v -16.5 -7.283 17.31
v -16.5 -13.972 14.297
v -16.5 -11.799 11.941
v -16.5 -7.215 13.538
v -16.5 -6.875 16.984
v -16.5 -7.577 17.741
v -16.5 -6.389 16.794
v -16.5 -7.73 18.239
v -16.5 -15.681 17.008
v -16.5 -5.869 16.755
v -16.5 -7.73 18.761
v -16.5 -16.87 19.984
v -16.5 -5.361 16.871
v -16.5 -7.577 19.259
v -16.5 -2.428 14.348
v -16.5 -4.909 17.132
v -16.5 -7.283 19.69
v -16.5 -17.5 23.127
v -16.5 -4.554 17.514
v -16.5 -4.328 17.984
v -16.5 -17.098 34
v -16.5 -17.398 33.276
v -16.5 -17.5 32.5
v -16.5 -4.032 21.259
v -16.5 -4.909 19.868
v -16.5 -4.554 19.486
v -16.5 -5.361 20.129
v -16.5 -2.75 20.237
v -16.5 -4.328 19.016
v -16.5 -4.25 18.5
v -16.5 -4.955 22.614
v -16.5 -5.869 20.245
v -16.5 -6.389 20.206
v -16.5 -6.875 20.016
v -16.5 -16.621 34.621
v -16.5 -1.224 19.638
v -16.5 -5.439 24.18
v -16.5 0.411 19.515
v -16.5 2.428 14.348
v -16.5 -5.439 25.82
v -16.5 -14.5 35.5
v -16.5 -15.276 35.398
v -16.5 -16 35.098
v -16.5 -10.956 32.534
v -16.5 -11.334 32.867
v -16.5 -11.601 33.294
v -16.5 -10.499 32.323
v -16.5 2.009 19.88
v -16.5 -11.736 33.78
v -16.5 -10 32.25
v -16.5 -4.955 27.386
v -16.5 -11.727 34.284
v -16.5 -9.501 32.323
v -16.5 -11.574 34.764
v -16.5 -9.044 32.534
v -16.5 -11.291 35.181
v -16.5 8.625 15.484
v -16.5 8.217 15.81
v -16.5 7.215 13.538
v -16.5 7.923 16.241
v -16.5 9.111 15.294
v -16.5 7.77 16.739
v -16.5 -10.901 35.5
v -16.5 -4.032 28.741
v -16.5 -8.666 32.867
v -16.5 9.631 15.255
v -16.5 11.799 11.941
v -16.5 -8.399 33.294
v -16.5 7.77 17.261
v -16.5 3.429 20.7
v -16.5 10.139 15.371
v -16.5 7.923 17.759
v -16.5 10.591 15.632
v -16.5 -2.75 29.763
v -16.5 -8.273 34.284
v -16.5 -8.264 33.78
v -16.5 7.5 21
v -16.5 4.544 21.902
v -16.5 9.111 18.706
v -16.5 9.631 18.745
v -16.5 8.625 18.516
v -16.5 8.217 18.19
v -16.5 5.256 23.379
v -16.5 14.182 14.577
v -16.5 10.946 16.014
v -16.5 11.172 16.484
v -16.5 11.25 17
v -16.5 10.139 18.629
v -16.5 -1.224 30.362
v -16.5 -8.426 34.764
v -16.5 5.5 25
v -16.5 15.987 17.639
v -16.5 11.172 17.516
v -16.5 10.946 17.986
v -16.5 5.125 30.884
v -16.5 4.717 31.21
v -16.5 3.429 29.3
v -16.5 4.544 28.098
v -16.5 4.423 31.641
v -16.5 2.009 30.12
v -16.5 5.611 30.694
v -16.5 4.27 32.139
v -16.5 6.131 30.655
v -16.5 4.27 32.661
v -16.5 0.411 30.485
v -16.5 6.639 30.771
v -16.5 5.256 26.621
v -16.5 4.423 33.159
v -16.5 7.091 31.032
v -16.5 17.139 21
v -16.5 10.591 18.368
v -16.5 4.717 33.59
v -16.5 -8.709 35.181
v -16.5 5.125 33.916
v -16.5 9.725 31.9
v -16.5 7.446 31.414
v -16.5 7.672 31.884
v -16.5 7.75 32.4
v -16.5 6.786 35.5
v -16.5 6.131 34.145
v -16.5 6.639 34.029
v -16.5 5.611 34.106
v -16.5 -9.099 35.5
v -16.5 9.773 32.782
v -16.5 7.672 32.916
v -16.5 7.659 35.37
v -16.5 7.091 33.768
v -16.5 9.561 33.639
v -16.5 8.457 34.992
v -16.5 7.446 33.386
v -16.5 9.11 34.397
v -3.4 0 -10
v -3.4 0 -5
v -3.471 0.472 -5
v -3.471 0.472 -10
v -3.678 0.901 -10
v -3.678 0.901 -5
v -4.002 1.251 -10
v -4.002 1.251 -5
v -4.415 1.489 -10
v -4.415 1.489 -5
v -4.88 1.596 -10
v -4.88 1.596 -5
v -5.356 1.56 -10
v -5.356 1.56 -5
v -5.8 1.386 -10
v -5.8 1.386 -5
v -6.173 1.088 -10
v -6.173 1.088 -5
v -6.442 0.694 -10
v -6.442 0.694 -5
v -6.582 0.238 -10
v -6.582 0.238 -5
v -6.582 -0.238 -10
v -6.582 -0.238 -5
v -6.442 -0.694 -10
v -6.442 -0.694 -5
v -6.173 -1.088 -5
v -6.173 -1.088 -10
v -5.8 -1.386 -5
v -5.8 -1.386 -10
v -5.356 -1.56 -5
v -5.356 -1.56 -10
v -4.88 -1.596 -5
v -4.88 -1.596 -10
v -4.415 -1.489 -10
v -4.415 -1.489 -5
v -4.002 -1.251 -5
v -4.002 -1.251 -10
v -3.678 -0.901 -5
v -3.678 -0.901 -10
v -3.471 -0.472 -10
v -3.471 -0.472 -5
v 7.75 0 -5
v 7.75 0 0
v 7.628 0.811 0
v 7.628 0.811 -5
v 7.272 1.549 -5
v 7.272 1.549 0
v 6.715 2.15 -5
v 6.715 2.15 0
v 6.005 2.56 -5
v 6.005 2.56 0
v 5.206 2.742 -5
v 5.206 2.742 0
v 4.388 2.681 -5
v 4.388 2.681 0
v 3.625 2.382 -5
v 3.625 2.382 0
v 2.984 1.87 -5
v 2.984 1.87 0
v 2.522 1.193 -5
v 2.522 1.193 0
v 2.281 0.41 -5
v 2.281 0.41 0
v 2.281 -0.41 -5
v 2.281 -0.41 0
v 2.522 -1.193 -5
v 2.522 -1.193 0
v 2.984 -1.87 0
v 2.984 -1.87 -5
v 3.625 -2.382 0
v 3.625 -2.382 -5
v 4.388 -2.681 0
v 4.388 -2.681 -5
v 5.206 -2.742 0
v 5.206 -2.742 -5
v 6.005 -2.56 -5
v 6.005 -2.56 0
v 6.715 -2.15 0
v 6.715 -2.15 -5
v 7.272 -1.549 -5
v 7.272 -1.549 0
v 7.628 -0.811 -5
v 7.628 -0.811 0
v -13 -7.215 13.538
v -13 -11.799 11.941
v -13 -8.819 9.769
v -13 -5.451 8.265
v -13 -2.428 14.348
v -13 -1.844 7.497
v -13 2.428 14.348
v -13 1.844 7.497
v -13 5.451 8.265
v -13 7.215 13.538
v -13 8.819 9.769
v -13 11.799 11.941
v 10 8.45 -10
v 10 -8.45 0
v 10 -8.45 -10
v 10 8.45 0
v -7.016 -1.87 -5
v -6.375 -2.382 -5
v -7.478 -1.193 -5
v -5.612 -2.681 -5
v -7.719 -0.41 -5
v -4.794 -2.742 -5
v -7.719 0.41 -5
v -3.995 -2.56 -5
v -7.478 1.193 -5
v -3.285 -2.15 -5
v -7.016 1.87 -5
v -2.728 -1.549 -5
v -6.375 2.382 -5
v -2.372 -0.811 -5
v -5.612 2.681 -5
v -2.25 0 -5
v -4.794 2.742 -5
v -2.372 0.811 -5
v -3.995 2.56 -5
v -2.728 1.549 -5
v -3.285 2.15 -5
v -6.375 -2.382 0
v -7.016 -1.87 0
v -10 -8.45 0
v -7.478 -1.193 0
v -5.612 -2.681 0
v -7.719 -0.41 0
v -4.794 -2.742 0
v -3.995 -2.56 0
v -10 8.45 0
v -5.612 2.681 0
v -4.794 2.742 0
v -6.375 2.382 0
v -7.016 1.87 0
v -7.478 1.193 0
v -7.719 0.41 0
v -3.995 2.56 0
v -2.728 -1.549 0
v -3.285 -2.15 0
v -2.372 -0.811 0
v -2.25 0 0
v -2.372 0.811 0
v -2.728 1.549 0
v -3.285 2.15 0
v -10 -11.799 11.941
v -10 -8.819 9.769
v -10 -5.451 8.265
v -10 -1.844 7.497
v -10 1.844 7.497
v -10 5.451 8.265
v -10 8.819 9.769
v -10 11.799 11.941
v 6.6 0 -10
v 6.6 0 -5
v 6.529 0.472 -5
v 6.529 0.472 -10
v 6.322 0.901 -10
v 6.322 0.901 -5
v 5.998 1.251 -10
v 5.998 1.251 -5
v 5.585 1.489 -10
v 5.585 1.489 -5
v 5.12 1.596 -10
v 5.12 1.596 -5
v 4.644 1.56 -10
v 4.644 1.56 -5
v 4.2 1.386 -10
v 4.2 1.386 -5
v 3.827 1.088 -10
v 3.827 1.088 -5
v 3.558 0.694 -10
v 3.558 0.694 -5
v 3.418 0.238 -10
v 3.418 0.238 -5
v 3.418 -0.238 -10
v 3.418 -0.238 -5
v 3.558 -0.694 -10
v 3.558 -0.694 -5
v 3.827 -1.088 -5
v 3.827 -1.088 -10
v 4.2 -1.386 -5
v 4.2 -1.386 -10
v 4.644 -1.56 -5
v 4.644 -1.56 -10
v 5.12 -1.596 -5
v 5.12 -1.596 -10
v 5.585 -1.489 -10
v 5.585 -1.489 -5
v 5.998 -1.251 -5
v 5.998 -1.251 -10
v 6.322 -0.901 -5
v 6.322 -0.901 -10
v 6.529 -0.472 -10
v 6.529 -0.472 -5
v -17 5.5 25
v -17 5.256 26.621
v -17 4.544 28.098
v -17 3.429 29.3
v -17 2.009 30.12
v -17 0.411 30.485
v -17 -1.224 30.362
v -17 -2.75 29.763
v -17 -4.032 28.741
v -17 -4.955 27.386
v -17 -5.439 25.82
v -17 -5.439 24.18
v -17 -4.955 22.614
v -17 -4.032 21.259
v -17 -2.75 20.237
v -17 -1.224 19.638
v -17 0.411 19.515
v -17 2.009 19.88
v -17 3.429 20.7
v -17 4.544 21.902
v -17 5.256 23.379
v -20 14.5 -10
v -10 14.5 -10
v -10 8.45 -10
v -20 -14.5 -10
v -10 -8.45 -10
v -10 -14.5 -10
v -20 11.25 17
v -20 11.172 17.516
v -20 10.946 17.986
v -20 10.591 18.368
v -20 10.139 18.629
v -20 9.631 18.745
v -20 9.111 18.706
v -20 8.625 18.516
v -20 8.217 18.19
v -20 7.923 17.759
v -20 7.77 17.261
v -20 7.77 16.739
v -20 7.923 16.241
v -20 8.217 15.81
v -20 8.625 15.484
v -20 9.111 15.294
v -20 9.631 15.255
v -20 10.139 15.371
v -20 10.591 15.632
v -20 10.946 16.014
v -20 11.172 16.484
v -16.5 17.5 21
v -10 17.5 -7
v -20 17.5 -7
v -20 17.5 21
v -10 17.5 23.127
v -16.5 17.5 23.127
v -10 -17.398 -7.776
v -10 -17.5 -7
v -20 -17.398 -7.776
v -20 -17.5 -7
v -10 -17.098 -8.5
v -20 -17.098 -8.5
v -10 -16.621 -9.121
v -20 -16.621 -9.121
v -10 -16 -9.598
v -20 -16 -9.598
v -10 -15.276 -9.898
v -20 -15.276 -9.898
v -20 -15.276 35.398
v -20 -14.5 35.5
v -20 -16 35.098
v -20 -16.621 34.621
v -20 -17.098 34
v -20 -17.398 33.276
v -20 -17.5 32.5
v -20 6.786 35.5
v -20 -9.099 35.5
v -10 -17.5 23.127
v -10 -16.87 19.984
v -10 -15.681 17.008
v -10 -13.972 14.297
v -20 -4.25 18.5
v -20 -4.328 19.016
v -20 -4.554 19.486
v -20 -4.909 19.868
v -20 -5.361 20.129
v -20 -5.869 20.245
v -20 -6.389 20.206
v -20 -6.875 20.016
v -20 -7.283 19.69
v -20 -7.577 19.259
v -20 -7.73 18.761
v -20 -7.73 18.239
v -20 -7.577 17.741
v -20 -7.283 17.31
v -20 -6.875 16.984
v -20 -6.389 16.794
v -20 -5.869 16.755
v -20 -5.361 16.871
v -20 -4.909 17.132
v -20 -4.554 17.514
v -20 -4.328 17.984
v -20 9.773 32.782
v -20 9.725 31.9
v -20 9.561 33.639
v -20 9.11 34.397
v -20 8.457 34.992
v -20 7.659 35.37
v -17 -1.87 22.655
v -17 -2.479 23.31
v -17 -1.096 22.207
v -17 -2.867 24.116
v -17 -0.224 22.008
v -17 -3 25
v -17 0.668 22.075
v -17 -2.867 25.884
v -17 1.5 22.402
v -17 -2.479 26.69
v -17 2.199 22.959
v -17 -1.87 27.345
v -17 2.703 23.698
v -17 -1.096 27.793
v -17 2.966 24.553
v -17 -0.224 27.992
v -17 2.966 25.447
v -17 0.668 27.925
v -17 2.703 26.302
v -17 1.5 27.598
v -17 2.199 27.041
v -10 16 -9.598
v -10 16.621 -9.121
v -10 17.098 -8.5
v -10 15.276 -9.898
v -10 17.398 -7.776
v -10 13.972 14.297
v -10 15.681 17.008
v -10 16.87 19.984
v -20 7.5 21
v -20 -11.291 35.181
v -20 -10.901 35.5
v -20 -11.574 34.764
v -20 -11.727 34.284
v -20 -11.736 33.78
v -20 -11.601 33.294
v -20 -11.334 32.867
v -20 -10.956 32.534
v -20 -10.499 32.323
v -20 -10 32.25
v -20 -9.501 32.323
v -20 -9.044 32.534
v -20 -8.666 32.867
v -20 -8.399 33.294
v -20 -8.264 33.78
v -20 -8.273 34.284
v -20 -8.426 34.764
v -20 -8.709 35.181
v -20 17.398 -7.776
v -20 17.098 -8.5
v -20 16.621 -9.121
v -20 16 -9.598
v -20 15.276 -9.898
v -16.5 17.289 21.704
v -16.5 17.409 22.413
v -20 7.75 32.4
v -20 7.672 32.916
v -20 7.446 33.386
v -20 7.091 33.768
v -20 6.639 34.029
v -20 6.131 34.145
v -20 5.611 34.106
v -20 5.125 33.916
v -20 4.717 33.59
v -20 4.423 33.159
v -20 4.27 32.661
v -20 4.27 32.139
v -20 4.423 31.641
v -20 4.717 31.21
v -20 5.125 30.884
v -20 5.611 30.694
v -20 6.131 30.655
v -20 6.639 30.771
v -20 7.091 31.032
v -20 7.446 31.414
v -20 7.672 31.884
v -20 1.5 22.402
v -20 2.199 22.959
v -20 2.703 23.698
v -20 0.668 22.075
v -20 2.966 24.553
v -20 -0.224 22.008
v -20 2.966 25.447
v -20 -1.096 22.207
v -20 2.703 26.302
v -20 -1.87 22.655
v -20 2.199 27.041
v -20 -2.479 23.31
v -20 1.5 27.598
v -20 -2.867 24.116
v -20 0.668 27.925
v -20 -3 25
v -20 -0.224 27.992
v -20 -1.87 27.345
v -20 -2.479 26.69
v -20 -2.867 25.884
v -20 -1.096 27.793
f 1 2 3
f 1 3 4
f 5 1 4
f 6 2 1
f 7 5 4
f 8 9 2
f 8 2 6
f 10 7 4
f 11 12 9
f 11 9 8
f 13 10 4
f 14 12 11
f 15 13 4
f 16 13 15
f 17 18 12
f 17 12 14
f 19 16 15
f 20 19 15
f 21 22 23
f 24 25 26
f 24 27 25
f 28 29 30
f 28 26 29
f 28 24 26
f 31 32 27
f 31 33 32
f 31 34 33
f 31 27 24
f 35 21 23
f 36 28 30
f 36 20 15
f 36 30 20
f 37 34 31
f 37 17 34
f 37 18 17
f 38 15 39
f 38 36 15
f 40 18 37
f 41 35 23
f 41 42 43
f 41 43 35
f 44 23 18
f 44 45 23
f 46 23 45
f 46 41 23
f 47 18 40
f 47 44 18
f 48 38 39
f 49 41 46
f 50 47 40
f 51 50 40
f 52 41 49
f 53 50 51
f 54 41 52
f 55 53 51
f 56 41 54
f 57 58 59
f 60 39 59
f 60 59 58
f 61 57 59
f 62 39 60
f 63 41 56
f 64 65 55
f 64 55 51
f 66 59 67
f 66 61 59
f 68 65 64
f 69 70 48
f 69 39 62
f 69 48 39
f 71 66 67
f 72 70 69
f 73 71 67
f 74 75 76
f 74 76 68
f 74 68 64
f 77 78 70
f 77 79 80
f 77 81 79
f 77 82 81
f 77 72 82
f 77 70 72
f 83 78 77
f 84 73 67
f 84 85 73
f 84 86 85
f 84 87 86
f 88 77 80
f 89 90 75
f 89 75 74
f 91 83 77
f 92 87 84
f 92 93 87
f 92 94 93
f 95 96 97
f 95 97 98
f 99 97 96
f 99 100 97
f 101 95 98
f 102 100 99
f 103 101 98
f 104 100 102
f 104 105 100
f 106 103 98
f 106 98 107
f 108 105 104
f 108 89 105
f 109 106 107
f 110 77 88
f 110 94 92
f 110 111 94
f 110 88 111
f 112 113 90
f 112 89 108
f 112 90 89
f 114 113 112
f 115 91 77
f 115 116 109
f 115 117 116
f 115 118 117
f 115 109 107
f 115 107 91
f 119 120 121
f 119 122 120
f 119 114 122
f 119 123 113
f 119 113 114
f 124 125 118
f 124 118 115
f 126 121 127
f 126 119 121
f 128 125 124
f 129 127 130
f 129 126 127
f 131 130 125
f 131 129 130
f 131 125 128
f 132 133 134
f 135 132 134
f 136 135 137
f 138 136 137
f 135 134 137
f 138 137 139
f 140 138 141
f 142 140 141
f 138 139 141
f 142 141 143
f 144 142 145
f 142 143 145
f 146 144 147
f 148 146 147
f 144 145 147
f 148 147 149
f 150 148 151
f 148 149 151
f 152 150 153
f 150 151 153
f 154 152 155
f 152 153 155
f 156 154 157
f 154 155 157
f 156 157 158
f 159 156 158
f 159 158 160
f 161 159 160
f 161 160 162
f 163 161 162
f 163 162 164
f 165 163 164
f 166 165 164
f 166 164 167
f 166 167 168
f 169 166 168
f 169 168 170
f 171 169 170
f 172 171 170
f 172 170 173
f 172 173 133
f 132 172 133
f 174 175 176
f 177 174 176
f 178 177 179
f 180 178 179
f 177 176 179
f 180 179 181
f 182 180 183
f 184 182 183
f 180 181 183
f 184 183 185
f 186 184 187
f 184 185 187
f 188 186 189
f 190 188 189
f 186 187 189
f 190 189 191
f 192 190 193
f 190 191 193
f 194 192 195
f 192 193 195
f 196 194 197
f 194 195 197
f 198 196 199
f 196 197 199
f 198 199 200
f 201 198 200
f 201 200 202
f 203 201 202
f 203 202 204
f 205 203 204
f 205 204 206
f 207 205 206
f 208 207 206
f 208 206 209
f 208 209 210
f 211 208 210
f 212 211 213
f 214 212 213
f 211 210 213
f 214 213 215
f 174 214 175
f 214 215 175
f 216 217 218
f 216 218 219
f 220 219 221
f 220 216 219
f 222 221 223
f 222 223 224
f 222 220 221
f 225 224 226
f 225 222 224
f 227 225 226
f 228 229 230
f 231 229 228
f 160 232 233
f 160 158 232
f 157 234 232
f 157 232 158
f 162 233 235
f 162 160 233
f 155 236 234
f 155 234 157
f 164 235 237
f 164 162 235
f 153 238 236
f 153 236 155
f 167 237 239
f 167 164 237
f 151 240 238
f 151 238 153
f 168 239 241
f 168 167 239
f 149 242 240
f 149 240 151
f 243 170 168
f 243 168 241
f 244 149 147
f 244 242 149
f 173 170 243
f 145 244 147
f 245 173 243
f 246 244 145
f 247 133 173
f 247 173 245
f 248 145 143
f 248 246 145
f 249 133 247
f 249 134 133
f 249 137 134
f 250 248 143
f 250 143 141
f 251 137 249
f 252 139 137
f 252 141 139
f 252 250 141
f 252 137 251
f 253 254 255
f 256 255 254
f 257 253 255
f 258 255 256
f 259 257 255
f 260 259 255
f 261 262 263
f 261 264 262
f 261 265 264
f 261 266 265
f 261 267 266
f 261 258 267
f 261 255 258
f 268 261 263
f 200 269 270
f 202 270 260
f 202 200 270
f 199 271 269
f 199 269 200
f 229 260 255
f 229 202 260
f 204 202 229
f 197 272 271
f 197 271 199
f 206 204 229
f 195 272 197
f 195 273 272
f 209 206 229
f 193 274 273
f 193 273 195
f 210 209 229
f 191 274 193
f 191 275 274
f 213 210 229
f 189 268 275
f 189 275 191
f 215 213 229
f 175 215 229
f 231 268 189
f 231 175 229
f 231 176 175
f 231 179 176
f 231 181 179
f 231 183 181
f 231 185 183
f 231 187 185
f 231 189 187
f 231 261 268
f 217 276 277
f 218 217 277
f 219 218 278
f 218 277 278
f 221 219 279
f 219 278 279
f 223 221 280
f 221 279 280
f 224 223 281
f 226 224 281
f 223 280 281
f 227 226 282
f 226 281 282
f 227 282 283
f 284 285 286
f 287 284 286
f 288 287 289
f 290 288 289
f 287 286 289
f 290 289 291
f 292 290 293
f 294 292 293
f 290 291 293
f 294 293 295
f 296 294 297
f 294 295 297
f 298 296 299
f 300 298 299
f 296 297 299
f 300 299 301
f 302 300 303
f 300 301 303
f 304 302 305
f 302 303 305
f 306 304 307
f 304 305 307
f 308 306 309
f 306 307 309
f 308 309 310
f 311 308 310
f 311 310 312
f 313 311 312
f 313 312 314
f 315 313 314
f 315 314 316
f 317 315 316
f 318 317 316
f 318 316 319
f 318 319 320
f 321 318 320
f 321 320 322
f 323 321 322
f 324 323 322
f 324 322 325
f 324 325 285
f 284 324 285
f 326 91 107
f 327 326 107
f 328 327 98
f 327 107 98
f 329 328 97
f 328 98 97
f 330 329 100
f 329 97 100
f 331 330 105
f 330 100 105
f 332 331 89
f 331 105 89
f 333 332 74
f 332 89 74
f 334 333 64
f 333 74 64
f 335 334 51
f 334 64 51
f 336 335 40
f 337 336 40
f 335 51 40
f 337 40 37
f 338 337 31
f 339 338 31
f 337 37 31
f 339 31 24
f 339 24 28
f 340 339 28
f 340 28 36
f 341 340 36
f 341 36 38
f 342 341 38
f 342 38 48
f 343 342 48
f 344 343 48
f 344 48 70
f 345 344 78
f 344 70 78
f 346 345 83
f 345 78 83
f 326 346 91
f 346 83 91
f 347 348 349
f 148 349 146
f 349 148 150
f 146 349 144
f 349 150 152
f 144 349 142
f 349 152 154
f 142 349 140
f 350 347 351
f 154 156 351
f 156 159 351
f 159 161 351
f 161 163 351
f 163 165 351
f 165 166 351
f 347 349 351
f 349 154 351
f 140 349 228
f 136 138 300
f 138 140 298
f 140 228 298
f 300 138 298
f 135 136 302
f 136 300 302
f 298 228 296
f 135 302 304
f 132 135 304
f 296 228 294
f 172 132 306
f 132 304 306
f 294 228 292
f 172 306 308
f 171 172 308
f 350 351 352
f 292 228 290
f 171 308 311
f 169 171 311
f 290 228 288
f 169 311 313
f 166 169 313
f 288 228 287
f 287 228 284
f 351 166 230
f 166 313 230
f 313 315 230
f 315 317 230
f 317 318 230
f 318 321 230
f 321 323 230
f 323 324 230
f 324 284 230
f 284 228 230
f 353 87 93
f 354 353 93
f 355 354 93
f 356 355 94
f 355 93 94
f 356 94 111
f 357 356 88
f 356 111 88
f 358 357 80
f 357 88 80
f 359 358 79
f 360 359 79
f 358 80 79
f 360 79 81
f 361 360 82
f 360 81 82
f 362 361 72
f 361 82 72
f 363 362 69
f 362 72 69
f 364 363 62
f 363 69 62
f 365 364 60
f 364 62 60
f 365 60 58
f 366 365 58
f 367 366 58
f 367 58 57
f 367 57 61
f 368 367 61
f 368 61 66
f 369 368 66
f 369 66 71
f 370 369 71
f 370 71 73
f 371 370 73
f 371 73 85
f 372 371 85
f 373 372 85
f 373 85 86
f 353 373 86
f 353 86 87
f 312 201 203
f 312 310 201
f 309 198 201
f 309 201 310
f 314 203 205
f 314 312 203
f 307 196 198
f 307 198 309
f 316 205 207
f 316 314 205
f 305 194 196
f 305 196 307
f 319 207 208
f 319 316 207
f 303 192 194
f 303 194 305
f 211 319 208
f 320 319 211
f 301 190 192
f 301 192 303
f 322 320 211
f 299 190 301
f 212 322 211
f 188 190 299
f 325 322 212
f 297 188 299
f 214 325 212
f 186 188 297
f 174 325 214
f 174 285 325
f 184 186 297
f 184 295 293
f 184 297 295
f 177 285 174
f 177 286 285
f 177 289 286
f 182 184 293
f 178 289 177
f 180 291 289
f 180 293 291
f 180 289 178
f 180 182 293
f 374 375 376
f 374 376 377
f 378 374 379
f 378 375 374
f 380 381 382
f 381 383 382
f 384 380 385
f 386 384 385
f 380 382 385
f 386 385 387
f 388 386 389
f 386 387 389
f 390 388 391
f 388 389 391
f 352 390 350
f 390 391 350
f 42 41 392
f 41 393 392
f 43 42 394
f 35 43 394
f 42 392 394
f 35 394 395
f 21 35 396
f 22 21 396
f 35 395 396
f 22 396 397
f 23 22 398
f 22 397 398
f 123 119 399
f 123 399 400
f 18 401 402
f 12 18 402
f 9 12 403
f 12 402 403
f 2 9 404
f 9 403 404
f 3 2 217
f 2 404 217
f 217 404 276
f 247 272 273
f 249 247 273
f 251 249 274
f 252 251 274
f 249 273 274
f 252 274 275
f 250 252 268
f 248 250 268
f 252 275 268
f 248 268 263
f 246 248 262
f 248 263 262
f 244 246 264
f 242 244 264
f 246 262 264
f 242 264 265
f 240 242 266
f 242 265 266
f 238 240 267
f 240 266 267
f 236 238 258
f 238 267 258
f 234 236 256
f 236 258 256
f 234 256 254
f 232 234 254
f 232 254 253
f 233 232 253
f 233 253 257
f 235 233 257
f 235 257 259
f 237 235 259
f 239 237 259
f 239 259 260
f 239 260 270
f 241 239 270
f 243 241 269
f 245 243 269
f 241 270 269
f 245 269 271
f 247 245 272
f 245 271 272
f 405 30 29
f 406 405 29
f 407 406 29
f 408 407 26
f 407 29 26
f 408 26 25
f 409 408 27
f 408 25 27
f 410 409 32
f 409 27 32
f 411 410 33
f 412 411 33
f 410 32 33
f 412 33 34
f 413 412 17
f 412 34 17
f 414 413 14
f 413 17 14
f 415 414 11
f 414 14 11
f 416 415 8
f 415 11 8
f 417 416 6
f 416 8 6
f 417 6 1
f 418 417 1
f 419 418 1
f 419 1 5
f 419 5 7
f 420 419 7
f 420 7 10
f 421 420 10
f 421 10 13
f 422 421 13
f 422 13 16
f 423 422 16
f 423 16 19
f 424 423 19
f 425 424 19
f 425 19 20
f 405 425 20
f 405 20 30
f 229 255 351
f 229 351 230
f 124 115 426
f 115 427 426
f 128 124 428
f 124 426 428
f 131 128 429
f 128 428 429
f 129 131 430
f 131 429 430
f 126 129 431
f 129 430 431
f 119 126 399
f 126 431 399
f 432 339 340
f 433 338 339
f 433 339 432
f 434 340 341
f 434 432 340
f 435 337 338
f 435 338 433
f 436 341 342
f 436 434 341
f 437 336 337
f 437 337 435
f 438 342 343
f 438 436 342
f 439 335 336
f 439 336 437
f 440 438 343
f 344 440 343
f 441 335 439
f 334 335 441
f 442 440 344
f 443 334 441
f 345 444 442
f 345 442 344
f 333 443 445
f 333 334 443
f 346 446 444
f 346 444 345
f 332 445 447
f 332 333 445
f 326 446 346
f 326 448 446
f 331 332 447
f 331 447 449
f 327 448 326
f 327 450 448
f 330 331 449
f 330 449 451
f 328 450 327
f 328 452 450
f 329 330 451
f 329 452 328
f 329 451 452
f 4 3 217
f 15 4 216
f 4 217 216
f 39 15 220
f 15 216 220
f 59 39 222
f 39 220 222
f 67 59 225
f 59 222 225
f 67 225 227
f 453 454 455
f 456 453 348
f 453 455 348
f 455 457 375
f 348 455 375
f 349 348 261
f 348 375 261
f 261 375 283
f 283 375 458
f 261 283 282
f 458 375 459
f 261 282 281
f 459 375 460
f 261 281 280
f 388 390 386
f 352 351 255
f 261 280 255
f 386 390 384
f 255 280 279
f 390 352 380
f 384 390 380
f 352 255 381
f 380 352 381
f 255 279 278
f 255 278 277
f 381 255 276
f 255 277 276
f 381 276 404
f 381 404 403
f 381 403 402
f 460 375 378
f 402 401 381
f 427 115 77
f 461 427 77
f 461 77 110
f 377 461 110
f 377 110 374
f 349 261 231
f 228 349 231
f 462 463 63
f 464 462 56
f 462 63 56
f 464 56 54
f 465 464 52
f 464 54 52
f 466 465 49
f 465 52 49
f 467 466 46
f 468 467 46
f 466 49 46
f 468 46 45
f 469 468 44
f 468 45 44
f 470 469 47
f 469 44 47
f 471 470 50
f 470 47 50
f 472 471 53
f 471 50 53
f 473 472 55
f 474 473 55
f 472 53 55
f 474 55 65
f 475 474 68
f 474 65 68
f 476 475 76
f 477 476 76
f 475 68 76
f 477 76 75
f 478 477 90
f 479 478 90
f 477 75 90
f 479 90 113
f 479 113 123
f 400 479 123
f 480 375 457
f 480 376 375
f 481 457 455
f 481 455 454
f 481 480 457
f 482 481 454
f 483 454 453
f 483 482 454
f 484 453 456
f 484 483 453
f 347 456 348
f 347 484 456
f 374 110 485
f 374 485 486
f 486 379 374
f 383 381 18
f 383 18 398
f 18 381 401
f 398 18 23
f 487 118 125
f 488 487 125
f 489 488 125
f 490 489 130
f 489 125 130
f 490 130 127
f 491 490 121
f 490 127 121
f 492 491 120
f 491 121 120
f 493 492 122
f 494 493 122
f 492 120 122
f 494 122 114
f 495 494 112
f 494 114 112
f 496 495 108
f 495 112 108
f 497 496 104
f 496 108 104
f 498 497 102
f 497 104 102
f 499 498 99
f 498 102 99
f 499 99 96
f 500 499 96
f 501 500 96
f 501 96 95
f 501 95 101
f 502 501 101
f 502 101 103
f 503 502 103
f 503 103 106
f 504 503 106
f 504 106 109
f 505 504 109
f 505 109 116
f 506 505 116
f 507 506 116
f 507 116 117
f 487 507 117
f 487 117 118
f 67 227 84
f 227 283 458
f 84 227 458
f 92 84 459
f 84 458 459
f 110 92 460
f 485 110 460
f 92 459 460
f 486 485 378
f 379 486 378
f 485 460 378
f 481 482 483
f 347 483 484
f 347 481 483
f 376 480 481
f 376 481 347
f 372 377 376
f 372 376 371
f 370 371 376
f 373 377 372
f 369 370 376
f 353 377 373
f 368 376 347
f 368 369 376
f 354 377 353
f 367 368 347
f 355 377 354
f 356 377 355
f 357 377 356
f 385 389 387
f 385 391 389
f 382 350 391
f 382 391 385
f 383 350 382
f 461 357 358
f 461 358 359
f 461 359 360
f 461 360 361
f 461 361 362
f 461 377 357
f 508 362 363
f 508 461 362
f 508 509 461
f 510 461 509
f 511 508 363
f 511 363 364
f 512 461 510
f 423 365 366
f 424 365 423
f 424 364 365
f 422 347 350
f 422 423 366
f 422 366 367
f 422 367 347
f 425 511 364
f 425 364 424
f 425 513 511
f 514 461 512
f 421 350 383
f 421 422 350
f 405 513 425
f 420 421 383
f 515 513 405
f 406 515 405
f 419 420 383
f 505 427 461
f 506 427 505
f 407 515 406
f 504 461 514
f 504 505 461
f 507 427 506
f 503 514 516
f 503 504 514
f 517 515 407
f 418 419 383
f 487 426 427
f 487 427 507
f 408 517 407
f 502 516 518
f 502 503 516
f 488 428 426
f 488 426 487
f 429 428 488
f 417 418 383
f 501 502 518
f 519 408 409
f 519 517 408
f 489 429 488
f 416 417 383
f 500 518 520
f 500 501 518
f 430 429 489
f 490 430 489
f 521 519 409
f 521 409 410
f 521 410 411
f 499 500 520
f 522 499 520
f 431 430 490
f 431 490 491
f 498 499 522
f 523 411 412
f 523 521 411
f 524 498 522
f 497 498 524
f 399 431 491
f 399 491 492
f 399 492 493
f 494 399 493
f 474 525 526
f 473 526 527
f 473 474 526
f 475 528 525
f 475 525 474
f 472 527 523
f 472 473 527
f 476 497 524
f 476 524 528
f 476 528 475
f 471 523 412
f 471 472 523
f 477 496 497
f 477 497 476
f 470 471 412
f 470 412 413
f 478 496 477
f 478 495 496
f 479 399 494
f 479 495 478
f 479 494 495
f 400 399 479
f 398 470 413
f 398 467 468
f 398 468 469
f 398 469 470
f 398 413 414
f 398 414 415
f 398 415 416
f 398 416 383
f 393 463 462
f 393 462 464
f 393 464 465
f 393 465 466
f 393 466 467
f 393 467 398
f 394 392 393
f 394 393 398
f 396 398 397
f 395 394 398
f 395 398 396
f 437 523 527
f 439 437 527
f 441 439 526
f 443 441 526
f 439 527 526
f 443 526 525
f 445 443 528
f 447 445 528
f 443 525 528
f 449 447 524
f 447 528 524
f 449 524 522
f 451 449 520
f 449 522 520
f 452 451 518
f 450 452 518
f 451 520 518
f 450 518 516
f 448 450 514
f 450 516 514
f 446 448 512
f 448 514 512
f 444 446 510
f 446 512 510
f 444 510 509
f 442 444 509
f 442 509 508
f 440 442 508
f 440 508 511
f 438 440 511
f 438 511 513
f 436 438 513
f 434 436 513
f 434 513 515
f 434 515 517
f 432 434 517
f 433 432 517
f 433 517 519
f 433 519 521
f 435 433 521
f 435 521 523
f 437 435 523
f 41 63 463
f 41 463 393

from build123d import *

# Parameters (mm, degrees)
F0_W      = 20
F0_H      = 16.9
F0_R      = 1.6
F1_DEPTH  = 10
F2_R      = 2.75
F3_DEPTH  = 5
F4_W      = 35
F4_H      = 45.5
F5_DEPTH  = 10
F6_R      = 3
F7_DEPTH  = 10
F8_R      = 3
F9_DEPTH  = 6.5
F10_R     = 1.75
F11_DEPTH = 10.001
F13_DEPTH = 3.501
F14_R     = 17.6
F15_DEPTH = 3
F16_R     = 3
F17_R     = 5.5
F18_DEPTH = 0.5


with BuildPart() as f1:
    # F0 (on Top) → F1 (new body)
    with BuildSketch(Plane.XY):
        Rectangle(F0_W, F0_H)
        with Locations((-5, 0)):
            Circle(F0_R, mode=Mode.SUBTRACT)
        with Locations((5, 0)):
            Circle(F0_R, mode=Mode.SUBTRACT)
    extrude(amount=-F1_DEPTH)

    # F2 (on face) → F3 (cut)
    with BuildSketch(Plane.XY):
        with Locations((-5, 0)):
            Circle(F2_R)
        with Locations((5, 0)):
            Circle(F2_R)
    extrude(amount=-F3_DEPTH, mode=Mode.SUBTRACT)

    # F4 (on face) → F5 (join)
    with BuildSketch(Plane(origin=(-10, 0, 0), x_dir=(0, -1, 0), z_dir=(-1, 0, 0))):
        with Locations((0, 12.75)):
            Rectangle(F4_W, F4_H)
    extrude(amount=F5_DEPTH)

    # F6 (on face) → F7 (cut, through all)
    with BuildSketch(Plane(origin=(-20, 0, 0), x_dir=(0, -1, 0), z_dir=(-1, 0, 0))):
        with Locations((0, 25)):
            Circle(F6_R)
    extrude(amount=-F7_DEPTH, mode=Mode.SUBTRACT)

    # F8 (on face) → F9 (cut)
    with BuildSketch(Plane.YZ.offset(-10)):
        with BuildLine():
            ThreePointArc((-11.7993208208, 11.9410556258), (0, 14.45), (11.7993208208, 11.9410556258))
            ThreePointArc((11.7993208208, 11.9410556258), (15.6809149912, 17.0081976351), (17.5, 23.1265006005))
            Line((17.5, 23.1265006005), (17.5, 35.5))
            Line((17.5, 35.5), (-17.5, 35.5))
            Line((-17.5, 35.5), (-17.5, 23.1265006005))
            ThreePointArc((-17.5, 23.1265006005), (-15.6809149912, 17.0081976351), (-11.7993208208, 11.9410556258))
        make_face()
        with Locations((0, 25)):
            Circle(F8_R, mode=Mode.SUBTRACT)
    extrude(amount=-F9_DEPTH, mode=Mode.SUBTRACT)

    # F10 (on face) → F11 (cut, through all)
    with BuildSketch(Plane.YZ.offset(-10)):
        with Locations((6, 32.4)):
            Circle(F10_R)
        with Locations((9.5, 17)):
            Circle(F10_R)
        with Locations((-6, 18.5)):
            Circle(F10_R)
        with Locations((-10, 34)):
            Circle(F10_R)
    extrude(amount=-F11_DEPTH, mode=Mode.SUBTRACT)

    # F12 (on face) → F13 (cut, through all)
    with BuildSketch(Plane.YZ.offset(-16.5)):
        Polygon((7.5, 21), (17.5, 21), (17.5, 35.5), (10.4602255331, 35.5), align=None)
    extrude(amount=-F13_DEPTH, mode=Mode.SUBTRACT)

    # F14 (on face) → F15 (cut)
    with BuildSketch(Plane.YZ.offset(-10)):
        with Locations((0, 25)):
            Circle(F14_R)
    extrude(amount=-F15_DEPTH, mode=Mode.SUBTRACT)

    # F16
    f16_edges = [f1.edges().sort_by_distance(p)[0] for p in [
        (-18.25, 10.460226, 35.5),
        (-18.25, -17.5, 35.5),
        (-15, -17.5, -10),
        (-15, 17.5, -10),
    ]]
    fillet(f16_edges, radius=F16_R)

    # F17 (on face) → F18 (cut)
    with BuildSketch(Plane.YZ.offset(-16.5)):
        with Locations((0, 25)):
            Circle(F17_R)
    extrude(amount=-F18_DEPTH, mode=Mode.SUBTRACT)


solid = f1.part
